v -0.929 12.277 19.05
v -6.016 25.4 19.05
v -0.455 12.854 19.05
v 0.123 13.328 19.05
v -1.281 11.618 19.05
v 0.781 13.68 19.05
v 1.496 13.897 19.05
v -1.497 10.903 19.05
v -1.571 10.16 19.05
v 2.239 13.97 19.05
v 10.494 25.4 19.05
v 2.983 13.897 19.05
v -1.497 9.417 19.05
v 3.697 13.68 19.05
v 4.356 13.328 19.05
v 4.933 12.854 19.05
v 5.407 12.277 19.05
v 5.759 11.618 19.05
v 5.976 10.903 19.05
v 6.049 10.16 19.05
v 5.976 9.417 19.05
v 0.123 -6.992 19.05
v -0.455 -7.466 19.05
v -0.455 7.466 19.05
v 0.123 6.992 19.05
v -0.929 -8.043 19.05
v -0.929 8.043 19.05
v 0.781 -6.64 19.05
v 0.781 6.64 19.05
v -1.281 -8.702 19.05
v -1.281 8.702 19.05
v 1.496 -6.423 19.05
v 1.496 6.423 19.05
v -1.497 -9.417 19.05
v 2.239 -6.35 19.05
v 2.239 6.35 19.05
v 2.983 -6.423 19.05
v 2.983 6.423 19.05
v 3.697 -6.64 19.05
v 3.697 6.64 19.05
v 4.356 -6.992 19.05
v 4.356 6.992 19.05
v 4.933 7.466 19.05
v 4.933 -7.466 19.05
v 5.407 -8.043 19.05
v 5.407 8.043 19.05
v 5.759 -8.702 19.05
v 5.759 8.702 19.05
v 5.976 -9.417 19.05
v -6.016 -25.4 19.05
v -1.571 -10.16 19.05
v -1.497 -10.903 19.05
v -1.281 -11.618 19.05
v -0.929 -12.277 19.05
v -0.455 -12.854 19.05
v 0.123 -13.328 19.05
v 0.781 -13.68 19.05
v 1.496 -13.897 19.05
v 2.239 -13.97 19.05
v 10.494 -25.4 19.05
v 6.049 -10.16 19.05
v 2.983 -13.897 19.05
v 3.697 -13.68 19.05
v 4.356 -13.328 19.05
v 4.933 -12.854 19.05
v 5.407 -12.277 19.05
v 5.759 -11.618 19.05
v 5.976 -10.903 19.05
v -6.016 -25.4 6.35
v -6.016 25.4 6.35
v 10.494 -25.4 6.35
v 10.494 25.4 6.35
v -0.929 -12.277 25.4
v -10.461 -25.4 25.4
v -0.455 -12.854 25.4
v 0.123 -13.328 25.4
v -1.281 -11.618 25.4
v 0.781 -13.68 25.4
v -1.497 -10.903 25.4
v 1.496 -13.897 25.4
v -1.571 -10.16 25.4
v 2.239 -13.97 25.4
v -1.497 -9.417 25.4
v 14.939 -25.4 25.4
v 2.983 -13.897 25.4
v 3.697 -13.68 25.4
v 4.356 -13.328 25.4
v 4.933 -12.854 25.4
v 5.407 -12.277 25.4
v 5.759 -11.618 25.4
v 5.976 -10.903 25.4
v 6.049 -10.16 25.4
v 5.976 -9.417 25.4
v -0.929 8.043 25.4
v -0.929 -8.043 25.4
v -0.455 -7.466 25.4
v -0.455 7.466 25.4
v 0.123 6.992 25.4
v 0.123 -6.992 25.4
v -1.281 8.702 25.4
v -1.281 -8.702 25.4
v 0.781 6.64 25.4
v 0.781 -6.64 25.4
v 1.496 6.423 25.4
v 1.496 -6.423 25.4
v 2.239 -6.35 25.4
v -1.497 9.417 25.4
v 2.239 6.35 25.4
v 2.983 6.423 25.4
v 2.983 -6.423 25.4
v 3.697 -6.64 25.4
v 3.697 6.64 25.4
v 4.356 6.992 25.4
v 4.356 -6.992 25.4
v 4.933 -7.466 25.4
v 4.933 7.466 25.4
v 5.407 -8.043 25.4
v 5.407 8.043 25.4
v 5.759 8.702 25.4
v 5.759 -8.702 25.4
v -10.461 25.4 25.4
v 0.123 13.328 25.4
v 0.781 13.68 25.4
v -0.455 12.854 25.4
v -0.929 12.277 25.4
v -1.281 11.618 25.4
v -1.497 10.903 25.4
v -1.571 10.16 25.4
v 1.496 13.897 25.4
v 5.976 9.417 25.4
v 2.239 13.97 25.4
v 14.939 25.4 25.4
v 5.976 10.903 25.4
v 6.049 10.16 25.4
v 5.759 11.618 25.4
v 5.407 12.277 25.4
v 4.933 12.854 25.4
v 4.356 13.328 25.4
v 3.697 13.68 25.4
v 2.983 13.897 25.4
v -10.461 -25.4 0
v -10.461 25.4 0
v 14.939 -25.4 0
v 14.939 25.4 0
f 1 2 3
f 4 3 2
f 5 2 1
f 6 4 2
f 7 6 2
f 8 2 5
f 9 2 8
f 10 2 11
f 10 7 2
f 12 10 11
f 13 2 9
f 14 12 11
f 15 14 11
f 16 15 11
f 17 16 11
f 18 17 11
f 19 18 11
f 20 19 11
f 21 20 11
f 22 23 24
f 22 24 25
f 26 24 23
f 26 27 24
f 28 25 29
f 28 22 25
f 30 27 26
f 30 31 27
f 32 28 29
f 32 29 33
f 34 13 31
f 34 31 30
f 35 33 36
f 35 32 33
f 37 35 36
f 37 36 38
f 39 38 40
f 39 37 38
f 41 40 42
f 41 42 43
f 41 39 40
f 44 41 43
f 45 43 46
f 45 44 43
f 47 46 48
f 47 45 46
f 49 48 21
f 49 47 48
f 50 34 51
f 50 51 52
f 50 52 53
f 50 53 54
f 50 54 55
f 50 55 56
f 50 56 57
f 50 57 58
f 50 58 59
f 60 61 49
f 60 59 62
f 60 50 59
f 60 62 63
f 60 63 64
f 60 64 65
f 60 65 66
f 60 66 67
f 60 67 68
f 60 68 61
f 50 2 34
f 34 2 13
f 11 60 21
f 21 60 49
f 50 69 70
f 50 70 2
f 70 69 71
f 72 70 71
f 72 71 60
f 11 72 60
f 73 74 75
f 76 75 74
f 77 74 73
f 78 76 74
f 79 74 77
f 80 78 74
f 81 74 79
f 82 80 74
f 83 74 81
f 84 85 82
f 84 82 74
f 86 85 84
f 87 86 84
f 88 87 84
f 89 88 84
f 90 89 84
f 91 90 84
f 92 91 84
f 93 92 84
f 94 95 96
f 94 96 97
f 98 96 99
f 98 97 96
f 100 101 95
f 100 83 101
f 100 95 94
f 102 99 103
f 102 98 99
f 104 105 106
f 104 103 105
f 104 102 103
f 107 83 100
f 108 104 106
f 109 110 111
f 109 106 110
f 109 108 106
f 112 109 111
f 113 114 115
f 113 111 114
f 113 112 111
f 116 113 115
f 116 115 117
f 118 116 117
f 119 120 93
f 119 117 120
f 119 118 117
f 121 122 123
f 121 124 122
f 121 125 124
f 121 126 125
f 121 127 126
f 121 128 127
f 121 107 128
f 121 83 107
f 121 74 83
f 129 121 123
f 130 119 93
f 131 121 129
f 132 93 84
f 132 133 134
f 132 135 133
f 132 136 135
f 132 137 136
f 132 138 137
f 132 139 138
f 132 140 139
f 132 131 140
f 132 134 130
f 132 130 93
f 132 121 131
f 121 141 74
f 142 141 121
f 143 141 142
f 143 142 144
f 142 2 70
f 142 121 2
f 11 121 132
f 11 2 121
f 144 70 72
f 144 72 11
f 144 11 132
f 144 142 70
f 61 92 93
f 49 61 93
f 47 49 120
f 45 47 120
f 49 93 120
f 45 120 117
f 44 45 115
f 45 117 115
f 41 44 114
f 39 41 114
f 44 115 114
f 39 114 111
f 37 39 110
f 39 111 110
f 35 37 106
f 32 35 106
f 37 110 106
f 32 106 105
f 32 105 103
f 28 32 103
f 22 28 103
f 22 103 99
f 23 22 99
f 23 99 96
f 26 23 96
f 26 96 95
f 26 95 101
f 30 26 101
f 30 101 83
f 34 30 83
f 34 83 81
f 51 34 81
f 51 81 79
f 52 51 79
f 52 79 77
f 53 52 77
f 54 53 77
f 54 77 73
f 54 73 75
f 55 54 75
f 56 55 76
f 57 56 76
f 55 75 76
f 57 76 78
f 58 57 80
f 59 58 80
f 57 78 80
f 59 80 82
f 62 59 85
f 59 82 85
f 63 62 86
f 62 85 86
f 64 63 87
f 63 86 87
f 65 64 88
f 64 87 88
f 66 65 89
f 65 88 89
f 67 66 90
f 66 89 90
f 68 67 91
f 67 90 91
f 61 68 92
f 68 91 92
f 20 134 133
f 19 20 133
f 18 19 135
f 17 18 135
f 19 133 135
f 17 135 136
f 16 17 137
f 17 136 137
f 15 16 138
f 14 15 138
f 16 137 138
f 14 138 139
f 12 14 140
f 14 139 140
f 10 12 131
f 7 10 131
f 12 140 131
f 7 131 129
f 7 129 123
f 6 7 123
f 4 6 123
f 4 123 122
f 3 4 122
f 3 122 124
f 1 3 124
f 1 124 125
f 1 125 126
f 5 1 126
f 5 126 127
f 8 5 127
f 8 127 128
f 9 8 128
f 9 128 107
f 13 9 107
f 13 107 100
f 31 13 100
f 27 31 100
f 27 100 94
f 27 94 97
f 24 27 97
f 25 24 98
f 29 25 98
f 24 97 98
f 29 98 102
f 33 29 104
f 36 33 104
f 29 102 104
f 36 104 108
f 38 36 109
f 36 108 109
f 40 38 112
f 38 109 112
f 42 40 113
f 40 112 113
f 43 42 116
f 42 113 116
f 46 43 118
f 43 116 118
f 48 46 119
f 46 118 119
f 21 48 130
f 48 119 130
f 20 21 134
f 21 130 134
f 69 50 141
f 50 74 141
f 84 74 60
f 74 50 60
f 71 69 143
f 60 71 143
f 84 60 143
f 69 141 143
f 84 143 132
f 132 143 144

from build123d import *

# Parameters (mm, degrees)
F0_W     = 25.4
F0_H     = 50.8
F1_DEPTH = 25.4
F2_W     = 16.51
F2_H     = 12.7
F3_DEPTH = 50.8
F4_R     = 3.81
F5_DEPTH = 15.24


with BuildPart() as f1:
    # F0 (on Top) → F1 (new body)
    with BuildSketch(Plane.XY):
        with Locations((2.239326, 0)):
            Rectangle(F0_W, F0_H)
    extrude(amount=F1_DEPTH)

    # F2 (on face) → F3 (cut)
    with BuildSketch(Plane.XZ.offset(25.4)):
        with Locations((2.239326, 12.7)):
            Rectangle(F2_W, F2_H)
    extrude(amount=-F3_DEPTH, mode=Mode.SUBTRACT)

    # F4 (on face) → F5 (cut)
    with BuildSketch(Plane.XY.offset(25.4)):
        with Locations((2.239326, 10.16)):
            Circle(F4_R)
        with Locations((2.239326, -10.16)):
            Circle(F4_R)
    extrude(amount=-F5_DEPTH, mode=Mode.SUBTRACT)


solid = f1.part
